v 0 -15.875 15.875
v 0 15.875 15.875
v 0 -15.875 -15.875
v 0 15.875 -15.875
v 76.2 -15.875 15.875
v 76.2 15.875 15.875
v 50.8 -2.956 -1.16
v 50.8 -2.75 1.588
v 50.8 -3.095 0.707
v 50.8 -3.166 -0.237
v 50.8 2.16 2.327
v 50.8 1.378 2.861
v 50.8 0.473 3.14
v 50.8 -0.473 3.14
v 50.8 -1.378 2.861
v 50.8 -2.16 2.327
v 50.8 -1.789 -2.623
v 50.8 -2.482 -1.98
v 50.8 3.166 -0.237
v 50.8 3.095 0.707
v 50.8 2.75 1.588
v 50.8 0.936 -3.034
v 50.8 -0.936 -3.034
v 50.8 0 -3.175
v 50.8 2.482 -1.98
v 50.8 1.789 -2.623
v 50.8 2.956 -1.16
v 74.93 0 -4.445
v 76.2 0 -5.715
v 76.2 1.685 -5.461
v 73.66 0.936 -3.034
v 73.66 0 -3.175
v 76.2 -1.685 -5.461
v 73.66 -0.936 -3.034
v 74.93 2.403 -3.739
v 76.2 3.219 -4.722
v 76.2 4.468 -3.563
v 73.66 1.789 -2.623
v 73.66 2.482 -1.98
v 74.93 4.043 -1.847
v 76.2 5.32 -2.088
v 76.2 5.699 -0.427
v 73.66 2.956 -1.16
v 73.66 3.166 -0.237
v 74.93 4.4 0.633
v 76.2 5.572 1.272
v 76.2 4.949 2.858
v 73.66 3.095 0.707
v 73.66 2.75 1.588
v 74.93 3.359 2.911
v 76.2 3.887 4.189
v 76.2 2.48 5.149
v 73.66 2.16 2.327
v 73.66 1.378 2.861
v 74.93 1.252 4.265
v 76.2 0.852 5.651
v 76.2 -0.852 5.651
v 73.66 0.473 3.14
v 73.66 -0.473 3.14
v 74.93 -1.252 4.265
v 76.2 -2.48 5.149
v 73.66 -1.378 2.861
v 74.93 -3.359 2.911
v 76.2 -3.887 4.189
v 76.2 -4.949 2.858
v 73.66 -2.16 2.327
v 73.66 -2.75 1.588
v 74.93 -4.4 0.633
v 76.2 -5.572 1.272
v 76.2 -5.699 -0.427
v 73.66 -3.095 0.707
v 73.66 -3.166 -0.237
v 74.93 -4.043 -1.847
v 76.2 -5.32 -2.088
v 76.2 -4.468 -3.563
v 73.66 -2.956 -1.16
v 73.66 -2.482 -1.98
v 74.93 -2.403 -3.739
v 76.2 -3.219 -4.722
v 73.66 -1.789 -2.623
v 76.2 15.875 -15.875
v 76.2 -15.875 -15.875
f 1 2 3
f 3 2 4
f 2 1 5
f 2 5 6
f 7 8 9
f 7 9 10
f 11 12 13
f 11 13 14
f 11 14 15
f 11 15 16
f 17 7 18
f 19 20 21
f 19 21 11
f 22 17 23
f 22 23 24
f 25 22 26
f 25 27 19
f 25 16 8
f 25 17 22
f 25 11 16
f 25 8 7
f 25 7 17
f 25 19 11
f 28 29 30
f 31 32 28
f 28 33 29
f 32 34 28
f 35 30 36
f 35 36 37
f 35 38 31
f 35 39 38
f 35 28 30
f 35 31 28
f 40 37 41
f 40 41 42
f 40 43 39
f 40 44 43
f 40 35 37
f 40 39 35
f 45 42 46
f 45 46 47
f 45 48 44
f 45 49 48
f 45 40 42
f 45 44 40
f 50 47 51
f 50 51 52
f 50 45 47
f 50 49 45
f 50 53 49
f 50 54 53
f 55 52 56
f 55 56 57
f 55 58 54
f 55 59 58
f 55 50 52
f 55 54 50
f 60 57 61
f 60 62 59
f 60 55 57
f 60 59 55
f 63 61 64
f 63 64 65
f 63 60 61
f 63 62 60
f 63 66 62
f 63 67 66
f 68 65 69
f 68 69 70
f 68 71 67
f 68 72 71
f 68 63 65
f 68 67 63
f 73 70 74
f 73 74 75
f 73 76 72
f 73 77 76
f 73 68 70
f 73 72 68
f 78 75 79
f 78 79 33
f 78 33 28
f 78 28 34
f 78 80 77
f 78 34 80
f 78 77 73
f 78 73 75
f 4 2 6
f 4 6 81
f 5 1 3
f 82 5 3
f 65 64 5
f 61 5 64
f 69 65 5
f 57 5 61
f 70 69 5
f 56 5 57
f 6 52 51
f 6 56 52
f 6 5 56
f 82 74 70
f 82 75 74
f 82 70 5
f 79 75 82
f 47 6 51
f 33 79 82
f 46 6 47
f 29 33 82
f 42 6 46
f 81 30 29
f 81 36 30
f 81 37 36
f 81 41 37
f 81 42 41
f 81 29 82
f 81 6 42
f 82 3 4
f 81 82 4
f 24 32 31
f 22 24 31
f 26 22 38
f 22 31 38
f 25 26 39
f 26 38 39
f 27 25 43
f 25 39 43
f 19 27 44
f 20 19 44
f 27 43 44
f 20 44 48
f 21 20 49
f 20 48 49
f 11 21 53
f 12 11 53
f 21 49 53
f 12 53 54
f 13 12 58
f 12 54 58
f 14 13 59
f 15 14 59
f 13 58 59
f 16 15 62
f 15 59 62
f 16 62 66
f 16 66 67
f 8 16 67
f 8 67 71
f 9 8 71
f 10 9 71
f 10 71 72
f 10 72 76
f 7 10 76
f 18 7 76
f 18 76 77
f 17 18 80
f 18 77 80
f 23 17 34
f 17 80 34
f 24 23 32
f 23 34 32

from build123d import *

# Parameters (mm, degrees)
SKETCH1_W           = 31.75
SKETCH1_H           = 31.75
BOSS_EXTRUDE1_DEPTH = 76.2
SKETCH2_R           = 3.175
CUT_EXTRUDE1_DEPTH  = 25.4
CHAMFER1_SIZE       = 2.54


with BuildPart() as part:
    # Sketch1 → Boss-Extrude1 (new body)
    with BuildSketch(Plane(origin=(0, 0, 0), x_dir=(0, 0, -1), z_dir=(1, 0, 0))):
        Rectangle(SKETCH1_W, SKETCH1_H)
    extrude(amount=BOSS_EXTRUDE1_DEPTH)

    # Sketch2 → Cut-Extrude1 (cut)
    with BuildSketch(Plane(origin=(76.2, 0, 0), x_dir=(0, 0, -1), z_dir=(1, 0, 0))):
        Circle(SKETCH2_R)
    extrude(amount=-CUT_EXTRUDE1_DEPTH, mode=Mode.SUBTRACT)

    # Chamfer1
    chamfer1_edges = [part.edges().sort_by_distance(p)[0] for p in [
        (76.2, 0, 3.175),
    ]]
    chamfer(chamfer1_edges, length=CHAMFER1_SIZE)


solid = part.part
